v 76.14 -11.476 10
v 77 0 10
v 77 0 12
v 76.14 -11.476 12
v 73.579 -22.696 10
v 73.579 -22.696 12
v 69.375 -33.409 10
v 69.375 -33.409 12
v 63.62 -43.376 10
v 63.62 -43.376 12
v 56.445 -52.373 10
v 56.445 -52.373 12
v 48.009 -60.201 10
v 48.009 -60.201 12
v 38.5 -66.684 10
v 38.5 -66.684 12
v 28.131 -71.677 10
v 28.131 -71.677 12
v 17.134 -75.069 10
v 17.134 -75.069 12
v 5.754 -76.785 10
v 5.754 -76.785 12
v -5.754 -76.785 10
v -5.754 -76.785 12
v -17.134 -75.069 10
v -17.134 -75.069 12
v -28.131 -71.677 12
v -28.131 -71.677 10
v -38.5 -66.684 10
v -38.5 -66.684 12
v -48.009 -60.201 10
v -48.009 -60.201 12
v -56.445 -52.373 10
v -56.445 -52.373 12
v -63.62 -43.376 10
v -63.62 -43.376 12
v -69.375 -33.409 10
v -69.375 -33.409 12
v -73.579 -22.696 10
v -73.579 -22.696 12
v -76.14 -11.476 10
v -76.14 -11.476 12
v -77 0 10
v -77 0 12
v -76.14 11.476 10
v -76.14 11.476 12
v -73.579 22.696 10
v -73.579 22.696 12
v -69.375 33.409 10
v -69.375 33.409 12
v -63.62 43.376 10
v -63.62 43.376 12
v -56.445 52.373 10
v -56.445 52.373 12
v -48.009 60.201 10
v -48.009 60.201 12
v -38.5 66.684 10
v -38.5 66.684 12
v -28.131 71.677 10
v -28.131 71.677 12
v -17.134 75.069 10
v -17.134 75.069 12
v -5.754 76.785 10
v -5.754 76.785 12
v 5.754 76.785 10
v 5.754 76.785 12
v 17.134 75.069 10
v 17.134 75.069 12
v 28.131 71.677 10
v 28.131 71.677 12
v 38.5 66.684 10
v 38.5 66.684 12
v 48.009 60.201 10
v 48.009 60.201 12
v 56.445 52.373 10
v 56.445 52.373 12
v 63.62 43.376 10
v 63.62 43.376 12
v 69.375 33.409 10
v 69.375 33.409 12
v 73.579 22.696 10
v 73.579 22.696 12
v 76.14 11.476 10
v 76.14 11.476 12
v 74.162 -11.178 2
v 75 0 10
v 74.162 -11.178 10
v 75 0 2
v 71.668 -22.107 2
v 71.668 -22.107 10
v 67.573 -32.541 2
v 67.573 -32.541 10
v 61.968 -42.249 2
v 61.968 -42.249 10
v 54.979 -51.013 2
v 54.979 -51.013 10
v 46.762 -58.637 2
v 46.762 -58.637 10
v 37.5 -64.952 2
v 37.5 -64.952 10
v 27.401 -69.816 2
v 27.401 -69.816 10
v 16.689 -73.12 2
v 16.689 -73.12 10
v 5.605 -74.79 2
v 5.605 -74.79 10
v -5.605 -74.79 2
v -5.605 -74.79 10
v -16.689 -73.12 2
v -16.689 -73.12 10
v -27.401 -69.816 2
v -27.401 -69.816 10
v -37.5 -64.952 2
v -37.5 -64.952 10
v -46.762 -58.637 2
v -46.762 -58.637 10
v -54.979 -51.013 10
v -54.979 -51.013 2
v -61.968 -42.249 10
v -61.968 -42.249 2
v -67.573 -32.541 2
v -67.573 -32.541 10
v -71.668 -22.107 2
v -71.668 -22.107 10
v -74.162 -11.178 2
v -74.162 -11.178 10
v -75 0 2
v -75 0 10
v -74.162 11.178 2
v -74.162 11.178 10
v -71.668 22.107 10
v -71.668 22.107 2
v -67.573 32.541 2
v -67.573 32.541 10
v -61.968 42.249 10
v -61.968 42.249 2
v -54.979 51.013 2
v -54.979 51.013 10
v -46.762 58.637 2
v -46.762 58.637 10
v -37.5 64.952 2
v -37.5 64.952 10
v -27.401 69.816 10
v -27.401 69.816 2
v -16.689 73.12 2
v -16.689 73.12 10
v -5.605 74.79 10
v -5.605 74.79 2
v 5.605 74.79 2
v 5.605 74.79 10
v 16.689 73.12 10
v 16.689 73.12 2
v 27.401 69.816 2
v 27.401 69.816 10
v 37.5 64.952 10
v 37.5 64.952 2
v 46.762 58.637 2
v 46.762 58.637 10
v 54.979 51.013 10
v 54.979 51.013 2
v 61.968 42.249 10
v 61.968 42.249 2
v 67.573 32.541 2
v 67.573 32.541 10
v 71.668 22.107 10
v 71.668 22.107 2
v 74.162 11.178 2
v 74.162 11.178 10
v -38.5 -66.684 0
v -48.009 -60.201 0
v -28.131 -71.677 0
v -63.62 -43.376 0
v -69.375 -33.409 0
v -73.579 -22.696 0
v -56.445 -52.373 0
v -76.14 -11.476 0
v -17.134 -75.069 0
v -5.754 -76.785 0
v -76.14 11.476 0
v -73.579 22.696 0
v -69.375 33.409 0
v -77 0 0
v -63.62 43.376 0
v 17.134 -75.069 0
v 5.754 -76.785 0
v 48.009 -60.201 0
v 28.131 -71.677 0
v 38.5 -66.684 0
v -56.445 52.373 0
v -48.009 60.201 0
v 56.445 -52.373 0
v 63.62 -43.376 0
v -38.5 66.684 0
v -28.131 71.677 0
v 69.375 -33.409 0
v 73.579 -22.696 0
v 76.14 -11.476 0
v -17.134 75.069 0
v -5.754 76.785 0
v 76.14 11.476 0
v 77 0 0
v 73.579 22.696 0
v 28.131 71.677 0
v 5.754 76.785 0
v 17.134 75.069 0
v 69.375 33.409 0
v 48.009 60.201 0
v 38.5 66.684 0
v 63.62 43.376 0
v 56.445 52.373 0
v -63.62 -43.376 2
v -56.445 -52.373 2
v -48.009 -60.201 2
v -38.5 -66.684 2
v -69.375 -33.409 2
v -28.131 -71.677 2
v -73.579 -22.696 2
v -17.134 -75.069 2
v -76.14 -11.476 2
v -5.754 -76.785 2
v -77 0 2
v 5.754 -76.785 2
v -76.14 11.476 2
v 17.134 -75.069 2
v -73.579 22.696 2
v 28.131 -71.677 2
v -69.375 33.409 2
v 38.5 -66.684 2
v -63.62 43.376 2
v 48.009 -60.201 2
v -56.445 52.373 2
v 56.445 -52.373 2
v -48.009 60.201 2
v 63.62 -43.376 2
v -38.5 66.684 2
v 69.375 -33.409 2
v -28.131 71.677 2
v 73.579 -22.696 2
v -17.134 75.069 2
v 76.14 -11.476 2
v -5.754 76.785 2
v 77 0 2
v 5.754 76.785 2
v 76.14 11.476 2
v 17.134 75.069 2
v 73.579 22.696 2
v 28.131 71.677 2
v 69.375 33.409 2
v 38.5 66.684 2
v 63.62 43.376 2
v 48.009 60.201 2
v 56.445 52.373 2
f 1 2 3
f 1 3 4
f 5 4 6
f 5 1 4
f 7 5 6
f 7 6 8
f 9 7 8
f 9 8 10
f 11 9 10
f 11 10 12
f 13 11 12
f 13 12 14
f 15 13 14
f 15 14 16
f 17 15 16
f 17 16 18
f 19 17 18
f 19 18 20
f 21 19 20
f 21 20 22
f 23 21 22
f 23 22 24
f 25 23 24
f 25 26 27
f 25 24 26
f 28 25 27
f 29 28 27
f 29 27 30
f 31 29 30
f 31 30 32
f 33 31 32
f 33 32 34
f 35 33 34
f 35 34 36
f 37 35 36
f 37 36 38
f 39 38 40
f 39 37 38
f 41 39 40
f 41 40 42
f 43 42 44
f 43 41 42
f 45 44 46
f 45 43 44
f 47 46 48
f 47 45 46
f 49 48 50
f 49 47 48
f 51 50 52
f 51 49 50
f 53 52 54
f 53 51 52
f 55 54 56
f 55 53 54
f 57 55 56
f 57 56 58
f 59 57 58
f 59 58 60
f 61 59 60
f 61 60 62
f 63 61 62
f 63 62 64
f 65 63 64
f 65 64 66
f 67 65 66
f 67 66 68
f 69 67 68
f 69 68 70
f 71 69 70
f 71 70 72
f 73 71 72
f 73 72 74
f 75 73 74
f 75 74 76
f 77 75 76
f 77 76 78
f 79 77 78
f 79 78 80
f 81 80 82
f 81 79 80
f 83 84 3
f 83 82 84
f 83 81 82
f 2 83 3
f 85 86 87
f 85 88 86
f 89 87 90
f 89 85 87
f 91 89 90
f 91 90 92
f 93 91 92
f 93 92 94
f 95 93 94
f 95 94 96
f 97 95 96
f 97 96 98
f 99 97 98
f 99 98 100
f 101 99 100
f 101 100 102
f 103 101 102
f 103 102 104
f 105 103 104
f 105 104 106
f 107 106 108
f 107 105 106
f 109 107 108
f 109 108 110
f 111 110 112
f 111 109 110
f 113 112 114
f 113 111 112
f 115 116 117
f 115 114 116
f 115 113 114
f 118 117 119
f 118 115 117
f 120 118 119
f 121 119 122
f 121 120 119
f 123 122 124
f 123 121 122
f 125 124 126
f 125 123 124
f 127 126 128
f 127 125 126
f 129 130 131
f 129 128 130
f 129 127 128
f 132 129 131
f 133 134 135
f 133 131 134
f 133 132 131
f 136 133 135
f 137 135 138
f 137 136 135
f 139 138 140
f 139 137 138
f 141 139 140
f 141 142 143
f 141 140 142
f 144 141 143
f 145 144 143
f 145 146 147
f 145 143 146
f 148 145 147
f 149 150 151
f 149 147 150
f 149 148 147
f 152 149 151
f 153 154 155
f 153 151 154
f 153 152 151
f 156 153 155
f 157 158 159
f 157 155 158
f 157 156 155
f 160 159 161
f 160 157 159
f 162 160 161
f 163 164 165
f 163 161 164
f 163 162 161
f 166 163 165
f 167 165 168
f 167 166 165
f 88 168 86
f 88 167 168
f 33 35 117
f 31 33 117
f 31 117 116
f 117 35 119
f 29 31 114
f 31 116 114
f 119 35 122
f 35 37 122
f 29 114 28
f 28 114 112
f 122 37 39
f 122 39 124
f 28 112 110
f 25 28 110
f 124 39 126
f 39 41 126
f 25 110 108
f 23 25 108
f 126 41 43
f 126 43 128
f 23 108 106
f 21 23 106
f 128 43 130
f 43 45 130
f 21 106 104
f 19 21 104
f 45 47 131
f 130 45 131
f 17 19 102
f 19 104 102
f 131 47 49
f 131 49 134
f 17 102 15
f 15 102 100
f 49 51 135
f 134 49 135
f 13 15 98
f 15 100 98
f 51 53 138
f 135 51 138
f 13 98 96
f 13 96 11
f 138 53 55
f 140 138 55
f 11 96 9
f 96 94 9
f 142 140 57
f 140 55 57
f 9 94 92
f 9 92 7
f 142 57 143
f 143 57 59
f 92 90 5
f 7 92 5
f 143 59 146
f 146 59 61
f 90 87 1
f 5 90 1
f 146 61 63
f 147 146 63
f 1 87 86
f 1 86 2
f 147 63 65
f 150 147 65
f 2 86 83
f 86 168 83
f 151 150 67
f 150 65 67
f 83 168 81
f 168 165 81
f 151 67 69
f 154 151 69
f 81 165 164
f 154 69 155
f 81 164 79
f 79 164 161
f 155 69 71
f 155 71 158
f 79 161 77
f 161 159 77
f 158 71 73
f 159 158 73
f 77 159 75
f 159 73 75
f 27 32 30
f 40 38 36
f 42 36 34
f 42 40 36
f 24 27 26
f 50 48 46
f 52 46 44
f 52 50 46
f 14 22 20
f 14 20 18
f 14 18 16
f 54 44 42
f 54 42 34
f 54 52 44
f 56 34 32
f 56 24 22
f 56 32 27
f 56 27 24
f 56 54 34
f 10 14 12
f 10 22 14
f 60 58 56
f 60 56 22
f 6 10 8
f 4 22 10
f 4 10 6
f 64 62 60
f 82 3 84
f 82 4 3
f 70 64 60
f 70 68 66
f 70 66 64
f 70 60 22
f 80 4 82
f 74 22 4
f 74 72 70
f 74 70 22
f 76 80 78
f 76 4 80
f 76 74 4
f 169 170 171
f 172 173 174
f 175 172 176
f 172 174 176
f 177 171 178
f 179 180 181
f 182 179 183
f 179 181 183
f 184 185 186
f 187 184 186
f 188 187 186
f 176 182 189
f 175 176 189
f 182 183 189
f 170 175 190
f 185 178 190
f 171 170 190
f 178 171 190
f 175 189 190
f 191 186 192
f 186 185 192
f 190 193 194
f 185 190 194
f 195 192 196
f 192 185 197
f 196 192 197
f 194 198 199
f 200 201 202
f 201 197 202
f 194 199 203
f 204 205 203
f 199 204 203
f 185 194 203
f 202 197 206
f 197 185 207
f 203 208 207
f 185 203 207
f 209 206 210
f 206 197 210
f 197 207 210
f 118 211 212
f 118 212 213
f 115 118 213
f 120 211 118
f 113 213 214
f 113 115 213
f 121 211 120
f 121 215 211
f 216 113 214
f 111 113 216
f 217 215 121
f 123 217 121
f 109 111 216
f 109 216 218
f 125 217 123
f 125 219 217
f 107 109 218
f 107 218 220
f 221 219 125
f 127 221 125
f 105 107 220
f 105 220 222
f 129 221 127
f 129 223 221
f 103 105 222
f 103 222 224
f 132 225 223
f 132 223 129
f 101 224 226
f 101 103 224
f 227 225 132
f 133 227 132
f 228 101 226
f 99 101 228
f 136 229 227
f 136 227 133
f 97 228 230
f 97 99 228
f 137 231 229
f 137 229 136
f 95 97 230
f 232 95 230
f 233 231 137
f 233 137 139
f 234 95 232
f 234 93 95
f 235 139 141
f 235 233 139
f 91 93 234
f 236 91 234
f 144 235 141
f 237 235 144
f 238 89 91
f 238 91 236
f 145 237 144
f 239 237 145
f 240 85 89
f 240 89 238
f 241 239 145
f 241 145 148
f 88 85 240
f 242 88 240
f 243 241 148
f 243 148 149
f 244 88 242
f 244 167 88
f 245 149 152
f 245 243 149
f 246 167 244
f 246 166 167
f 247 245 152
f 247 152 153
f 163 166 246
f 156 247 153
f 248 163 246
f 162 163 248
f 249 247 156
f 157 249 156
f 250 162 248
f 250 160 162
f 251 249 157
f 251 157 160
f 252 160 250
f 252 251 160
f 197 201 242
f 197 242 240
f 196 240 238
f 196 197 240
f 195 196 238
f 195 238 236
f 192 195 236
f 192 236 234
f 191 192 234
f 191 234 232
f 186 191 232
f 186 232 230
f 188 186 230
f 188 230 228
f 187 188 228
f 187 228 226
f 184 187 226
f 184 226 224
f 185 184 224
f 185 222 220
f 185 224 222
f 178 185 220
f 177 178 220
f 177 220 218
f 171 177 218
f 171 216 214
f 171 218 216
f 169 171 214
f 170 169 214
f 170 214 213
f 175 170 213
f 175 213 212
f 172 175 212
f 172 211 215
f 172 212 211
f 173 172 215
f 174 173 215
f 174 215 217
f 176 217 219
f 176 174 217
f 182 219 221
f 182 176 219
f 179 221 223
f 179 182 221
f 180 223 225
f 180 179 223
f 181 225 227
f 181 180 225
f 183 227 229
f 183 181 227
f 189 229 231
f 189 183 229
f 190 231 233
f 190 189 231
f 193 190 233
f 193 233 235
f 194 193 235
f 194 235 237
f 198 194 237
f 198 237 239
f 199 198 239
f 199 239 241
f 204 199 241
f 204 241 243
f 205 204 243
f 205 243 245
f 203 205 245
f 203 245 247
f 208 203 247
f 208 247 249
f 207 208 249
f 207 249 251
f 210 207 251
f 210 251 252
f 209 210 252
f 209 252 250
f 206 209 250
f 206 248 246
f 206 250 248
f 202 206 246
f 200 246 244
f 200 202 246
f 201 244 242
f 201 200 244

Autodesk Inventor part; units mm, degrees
ref_plane "YZ Plane" through (0, 0, 0) normal (1, 0, 0) x (0, 1, 0)
ref_plane "XZ Plane" through (0, 0, 0) normal (0, 1, 0) x (-1, 0, 0)
ref_plane "XY Plane" through (0, 0, 0) normal (0, 0, 1) x (1, 0, 0)
sketch "Sketch1" plane through (0, 0, 0) normal (0, 0, 1) x (1, 0, 0)
  circle A0 centre (0, 0) radius 77
  dimension "d0" = 154
extrude "Extrusion1" add sketch "Sketch1" along normal blind 2
sketch "Sketch2" plane through (0, 0, 2) normal (0, 0, 1) x (1, 0, 0)
  circle A0 centre (0, 0) radius 77 projected
  circle A1 centre (0, 0) radius 75
  dimension "d4" = 150
extrude "Extrusion2" add sketch "Sketch2" along normal blind 8 contours A1
sketch "Sketch3" plane through (0, 0, 10) normal (0, 0, 1) x (1, 0, 0)
  circle A0 centre (0, 0) radius 77 projected
extrude "Extrusion3" add sketch "Sketch3" along normal blind 2
sketch "Sketch4" plane through (0, 0, 0) normal (0, 0, -1) x (-1, 0, 0)
  circle A0 centre (0, 0) radius 77 projected
  line L0 (75.9786, 12.5) -> (0, 12.5)
  arc A1 (0, 12.5) -> (0, -12.5) centre (0, 0) ccw
  line L1 (0, -12.5) -> (75.9786, -12.5)
  dimension "d10" = 12.5
properties part number "pulley template"
